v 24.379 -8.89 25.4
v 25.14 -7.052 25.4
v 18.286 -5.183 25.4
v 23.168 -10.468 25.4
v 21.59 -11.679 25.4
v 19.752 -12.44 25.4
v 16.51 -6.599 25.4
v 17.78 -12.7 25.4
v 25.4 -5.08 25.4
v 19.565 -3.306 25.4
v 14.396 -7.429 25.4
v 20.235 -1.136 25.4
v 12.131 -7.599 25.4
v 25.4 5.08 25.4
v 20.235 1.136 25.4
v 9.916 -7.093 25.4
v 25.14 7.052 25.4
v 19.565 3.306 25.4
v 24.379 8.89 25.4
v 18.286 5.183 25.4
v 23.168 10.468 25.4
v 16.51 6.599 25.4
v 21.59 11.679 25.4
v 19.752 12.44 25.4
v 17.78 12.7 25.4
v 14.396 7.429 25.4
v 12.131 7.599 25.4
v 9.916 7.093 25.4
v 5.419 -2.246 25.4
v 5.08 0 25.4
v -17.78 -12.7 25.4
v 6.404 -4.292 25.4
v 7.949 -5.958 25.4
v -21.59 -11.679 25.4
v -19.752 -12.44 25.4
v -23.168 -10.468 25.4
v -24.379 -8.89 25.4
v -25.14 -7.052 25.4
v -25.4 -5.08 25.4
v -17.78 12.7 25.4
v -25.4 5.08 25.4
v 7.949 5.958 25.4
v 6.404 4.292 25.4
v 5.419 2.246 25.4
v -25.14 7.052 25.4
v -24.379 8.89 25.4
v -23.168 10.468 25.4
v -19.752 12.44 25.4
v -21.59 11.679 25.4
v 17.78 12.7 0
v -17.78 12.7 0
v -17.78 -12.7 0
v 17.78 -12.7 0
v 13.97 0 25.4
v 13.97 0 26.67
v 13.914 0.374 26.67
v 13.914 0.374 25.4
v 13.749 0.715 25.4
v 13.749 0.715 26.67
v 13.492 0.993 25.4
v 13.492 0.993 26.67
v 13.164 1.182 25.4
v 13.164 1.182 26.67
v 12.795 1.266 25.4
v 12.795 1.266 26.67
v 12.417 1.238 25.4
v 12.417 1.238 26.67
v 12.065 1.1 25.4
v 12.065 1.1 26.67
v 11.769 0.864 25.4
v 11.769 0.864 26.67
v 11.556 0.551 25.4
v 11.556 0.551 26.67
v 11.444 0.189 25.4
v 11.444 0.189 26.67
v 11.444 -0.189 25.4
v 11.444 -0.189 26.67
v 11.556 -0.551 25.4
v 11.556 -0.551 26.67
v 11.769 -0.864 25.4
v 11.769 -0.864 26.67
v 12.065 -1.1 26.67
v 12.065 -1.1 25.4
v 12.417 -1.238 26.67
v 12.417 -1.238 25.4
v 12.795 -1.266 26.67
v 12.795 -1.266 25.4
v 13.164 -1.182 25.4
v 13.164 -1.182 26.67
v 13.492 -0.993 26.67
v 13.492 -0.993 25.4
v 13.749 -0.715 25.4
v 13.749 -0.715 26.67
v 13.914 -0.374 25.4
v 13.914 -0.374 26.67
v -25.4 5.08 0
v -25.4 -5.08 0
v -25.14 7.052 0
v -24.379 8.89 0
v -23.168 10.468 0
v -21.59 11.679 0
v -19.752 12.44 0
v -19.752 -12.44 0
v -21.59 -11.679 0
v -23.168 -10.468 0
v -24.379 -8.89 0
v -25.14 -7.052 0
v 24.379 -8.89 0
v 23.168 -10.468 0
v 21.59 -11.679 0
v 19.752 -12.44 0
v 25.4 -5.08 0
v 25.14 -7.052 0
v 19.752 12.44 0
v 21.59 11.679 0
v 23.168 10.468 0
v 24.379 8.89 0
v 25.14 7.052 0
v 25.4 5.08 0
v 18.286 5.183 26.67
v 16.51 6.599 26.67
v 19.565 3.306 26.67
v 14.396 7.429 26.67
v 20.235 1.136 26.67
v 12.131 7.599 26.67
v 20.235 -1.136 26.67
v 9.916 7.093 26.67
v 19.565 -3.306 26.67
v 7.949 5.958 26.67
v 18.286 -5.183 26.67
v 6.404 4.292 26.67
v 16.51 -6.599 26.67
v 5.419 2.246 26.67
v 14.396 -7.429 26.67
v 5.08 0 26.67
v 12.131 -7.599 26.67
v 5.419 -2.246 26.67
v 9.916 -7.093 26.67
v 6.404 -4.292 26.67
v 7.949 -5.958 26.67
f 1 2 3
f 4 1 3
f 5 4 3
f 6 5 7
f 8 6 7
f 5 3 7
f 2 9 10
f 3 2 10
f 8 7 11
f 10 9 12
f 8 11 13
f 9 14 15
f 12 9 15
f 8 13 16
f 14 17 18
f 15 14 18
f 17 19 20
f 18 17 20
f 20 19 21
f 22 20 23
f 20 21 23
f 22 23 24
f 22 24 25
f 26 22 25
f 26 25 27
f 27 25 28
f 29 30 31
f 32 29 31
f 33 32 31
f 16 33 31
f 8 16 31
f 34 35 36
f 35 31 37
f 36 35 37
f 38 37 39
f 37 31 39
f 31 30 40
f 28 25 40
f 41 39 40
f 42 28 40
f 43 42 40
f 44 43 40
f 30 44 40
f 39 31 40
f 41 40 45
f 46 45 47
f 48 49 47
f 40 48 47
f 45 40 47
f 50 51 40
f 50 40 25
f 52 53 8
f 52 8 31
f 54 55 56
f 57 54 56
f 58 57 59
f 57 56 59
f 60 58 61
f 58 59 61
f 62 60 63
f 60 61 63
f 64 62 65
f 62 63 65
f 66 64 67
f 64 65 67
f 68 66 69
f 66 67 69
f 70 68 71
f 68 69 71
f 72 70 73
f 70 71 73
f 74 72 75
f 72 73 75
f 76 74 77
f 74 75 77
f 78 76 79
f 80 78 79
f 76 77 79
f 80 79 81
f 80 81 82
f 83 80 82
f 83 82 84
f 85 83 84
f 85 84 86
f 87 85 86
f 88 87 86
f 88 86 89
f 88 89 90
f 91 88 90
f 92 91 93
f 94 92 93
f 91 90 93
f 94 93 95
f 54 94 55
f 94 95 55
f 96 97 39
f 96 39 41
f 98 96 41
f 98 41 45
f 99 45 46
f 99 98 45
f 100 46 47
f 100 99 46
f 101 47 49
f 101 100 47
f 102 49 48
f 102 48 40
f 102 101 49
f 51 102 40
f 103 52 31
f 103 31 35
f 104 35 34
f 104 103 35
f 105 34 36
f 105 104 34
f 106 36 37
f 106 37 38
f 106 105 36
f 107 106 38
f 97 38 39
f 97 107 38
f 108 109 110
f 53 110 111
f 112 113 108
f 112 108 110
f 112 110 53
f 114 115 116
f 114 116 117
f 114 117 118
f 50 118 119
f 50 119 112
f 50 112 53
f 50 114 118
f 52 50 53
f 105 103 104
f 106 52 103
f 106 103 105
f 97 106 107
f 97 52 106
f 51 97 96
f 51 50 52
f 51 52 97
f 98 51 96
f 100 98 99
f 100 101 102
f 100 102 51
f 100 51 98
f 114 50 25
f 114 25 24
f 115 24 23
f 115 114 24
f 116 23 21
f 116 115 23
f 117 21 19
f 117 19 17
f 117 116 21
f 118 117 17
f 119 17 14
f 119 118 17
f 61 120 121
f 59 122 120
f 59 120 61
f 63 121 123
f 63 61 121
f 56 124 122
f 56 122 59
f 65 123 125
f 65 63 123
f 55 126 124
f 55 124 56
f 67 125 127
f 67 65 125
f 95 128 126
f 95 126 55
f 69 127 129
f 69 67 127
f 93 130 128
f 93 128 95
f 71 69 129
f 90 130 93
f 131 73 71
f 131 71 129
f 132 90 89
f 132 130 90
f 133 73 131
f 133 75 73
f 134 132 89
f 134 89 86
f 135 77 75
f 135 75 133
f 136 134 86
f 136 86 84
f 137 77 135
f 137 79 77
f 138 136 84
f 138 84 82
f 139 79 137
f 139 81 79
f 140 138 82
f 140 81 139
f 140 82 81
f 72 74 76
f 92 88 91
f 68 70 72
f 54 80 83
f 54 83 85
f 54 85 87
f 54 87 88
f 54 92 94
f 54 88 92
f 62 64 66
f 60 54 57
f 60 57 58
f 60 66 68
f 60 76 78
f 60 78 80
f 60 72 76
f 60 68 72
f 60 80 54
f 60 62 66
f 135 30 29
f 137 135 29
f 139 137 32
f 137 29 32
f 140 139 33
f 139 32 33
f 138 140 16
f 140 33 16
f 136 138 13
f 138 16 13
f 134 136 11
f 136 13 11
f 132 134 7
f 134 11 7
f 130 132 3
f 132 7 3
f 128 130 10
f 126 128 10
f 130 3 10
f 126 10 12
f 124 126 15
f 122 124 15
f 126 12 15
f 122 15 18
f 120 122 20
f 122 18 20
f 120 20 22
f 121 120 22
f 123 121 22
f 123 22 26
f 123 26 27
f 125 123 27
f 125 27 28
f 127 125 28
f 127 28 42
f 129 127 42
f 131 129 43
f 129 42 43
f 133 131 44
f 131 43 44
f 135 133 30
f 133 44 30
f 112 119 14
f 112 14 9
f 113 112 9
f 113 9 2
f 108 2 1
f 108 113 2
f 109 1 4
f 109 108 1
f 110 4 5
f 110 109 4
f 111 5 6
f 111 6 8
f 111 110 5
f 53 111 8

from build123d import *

# Parameters (mm, degrees)
BOSS_EXTRUDE1_DEPTH = 25.4
SKETCH2_R           = 7.62
BOSS_EXTRUDE2_DEPTH = 1.27
SKETCH3_R           = 1.27
CUT_EXTRUDE1_DEPTH  = 1.27


with BuildPart() as part:
    # Sketch1 → Boss-Extrude1 (new body)
    with BuildSketch(Plane.XY):
        with BuildLine():
            Line((-17.78, 12.7), (17.78, 12.7))
            ThreePointArc((17.78, 12.7), (23.168153673, 10.468153673), (25.4, 5.08))
            Line((25.4, 5.08), (25.4, -5.08))
            ThreePointArc((25.4, -5.08), (23.168153673, -10.468153673), (17.78, -12.7))
            Line((17.78, -12.7), (-17.78, -12.7))
            ThreePointArc((-17.78, -12.7), (-23.168153673, -10.468153673), (-25.4, -5.08))
            Line((-25.4, -5.08), (-25.4, 5.08))
            ThreePointArc((-25.4, 5.08), (-23.168153673, 10.468153673), (-17.78, 12.7))
        make_face()
    extrude(amount=BOSS_EXTRUDE1_DEPTH)

    # Sketch2 → Boss-Extrude2 (add)
    with BuildSketch(Plane.XY.offset(25.4)):
        with Locations(Location((12.7, 0, 0), (0, 0, 180))):
            Circle(SKETCH2_R)
    extrude(amount=BOSS_EXTRUDE2_DEPTH)

    # Sketch3 → Cut-Extrude1 (cut)
    with BuildSketch(Plane.XY.offset(26.67)):
        with Locations((12.7, 0)):
            Circle(SKETCH3_R)
    extrude(amount=-CUT_EXTRUDE1_DEPTH, mode=Mode.SUBTRACT)


solid = part.part
